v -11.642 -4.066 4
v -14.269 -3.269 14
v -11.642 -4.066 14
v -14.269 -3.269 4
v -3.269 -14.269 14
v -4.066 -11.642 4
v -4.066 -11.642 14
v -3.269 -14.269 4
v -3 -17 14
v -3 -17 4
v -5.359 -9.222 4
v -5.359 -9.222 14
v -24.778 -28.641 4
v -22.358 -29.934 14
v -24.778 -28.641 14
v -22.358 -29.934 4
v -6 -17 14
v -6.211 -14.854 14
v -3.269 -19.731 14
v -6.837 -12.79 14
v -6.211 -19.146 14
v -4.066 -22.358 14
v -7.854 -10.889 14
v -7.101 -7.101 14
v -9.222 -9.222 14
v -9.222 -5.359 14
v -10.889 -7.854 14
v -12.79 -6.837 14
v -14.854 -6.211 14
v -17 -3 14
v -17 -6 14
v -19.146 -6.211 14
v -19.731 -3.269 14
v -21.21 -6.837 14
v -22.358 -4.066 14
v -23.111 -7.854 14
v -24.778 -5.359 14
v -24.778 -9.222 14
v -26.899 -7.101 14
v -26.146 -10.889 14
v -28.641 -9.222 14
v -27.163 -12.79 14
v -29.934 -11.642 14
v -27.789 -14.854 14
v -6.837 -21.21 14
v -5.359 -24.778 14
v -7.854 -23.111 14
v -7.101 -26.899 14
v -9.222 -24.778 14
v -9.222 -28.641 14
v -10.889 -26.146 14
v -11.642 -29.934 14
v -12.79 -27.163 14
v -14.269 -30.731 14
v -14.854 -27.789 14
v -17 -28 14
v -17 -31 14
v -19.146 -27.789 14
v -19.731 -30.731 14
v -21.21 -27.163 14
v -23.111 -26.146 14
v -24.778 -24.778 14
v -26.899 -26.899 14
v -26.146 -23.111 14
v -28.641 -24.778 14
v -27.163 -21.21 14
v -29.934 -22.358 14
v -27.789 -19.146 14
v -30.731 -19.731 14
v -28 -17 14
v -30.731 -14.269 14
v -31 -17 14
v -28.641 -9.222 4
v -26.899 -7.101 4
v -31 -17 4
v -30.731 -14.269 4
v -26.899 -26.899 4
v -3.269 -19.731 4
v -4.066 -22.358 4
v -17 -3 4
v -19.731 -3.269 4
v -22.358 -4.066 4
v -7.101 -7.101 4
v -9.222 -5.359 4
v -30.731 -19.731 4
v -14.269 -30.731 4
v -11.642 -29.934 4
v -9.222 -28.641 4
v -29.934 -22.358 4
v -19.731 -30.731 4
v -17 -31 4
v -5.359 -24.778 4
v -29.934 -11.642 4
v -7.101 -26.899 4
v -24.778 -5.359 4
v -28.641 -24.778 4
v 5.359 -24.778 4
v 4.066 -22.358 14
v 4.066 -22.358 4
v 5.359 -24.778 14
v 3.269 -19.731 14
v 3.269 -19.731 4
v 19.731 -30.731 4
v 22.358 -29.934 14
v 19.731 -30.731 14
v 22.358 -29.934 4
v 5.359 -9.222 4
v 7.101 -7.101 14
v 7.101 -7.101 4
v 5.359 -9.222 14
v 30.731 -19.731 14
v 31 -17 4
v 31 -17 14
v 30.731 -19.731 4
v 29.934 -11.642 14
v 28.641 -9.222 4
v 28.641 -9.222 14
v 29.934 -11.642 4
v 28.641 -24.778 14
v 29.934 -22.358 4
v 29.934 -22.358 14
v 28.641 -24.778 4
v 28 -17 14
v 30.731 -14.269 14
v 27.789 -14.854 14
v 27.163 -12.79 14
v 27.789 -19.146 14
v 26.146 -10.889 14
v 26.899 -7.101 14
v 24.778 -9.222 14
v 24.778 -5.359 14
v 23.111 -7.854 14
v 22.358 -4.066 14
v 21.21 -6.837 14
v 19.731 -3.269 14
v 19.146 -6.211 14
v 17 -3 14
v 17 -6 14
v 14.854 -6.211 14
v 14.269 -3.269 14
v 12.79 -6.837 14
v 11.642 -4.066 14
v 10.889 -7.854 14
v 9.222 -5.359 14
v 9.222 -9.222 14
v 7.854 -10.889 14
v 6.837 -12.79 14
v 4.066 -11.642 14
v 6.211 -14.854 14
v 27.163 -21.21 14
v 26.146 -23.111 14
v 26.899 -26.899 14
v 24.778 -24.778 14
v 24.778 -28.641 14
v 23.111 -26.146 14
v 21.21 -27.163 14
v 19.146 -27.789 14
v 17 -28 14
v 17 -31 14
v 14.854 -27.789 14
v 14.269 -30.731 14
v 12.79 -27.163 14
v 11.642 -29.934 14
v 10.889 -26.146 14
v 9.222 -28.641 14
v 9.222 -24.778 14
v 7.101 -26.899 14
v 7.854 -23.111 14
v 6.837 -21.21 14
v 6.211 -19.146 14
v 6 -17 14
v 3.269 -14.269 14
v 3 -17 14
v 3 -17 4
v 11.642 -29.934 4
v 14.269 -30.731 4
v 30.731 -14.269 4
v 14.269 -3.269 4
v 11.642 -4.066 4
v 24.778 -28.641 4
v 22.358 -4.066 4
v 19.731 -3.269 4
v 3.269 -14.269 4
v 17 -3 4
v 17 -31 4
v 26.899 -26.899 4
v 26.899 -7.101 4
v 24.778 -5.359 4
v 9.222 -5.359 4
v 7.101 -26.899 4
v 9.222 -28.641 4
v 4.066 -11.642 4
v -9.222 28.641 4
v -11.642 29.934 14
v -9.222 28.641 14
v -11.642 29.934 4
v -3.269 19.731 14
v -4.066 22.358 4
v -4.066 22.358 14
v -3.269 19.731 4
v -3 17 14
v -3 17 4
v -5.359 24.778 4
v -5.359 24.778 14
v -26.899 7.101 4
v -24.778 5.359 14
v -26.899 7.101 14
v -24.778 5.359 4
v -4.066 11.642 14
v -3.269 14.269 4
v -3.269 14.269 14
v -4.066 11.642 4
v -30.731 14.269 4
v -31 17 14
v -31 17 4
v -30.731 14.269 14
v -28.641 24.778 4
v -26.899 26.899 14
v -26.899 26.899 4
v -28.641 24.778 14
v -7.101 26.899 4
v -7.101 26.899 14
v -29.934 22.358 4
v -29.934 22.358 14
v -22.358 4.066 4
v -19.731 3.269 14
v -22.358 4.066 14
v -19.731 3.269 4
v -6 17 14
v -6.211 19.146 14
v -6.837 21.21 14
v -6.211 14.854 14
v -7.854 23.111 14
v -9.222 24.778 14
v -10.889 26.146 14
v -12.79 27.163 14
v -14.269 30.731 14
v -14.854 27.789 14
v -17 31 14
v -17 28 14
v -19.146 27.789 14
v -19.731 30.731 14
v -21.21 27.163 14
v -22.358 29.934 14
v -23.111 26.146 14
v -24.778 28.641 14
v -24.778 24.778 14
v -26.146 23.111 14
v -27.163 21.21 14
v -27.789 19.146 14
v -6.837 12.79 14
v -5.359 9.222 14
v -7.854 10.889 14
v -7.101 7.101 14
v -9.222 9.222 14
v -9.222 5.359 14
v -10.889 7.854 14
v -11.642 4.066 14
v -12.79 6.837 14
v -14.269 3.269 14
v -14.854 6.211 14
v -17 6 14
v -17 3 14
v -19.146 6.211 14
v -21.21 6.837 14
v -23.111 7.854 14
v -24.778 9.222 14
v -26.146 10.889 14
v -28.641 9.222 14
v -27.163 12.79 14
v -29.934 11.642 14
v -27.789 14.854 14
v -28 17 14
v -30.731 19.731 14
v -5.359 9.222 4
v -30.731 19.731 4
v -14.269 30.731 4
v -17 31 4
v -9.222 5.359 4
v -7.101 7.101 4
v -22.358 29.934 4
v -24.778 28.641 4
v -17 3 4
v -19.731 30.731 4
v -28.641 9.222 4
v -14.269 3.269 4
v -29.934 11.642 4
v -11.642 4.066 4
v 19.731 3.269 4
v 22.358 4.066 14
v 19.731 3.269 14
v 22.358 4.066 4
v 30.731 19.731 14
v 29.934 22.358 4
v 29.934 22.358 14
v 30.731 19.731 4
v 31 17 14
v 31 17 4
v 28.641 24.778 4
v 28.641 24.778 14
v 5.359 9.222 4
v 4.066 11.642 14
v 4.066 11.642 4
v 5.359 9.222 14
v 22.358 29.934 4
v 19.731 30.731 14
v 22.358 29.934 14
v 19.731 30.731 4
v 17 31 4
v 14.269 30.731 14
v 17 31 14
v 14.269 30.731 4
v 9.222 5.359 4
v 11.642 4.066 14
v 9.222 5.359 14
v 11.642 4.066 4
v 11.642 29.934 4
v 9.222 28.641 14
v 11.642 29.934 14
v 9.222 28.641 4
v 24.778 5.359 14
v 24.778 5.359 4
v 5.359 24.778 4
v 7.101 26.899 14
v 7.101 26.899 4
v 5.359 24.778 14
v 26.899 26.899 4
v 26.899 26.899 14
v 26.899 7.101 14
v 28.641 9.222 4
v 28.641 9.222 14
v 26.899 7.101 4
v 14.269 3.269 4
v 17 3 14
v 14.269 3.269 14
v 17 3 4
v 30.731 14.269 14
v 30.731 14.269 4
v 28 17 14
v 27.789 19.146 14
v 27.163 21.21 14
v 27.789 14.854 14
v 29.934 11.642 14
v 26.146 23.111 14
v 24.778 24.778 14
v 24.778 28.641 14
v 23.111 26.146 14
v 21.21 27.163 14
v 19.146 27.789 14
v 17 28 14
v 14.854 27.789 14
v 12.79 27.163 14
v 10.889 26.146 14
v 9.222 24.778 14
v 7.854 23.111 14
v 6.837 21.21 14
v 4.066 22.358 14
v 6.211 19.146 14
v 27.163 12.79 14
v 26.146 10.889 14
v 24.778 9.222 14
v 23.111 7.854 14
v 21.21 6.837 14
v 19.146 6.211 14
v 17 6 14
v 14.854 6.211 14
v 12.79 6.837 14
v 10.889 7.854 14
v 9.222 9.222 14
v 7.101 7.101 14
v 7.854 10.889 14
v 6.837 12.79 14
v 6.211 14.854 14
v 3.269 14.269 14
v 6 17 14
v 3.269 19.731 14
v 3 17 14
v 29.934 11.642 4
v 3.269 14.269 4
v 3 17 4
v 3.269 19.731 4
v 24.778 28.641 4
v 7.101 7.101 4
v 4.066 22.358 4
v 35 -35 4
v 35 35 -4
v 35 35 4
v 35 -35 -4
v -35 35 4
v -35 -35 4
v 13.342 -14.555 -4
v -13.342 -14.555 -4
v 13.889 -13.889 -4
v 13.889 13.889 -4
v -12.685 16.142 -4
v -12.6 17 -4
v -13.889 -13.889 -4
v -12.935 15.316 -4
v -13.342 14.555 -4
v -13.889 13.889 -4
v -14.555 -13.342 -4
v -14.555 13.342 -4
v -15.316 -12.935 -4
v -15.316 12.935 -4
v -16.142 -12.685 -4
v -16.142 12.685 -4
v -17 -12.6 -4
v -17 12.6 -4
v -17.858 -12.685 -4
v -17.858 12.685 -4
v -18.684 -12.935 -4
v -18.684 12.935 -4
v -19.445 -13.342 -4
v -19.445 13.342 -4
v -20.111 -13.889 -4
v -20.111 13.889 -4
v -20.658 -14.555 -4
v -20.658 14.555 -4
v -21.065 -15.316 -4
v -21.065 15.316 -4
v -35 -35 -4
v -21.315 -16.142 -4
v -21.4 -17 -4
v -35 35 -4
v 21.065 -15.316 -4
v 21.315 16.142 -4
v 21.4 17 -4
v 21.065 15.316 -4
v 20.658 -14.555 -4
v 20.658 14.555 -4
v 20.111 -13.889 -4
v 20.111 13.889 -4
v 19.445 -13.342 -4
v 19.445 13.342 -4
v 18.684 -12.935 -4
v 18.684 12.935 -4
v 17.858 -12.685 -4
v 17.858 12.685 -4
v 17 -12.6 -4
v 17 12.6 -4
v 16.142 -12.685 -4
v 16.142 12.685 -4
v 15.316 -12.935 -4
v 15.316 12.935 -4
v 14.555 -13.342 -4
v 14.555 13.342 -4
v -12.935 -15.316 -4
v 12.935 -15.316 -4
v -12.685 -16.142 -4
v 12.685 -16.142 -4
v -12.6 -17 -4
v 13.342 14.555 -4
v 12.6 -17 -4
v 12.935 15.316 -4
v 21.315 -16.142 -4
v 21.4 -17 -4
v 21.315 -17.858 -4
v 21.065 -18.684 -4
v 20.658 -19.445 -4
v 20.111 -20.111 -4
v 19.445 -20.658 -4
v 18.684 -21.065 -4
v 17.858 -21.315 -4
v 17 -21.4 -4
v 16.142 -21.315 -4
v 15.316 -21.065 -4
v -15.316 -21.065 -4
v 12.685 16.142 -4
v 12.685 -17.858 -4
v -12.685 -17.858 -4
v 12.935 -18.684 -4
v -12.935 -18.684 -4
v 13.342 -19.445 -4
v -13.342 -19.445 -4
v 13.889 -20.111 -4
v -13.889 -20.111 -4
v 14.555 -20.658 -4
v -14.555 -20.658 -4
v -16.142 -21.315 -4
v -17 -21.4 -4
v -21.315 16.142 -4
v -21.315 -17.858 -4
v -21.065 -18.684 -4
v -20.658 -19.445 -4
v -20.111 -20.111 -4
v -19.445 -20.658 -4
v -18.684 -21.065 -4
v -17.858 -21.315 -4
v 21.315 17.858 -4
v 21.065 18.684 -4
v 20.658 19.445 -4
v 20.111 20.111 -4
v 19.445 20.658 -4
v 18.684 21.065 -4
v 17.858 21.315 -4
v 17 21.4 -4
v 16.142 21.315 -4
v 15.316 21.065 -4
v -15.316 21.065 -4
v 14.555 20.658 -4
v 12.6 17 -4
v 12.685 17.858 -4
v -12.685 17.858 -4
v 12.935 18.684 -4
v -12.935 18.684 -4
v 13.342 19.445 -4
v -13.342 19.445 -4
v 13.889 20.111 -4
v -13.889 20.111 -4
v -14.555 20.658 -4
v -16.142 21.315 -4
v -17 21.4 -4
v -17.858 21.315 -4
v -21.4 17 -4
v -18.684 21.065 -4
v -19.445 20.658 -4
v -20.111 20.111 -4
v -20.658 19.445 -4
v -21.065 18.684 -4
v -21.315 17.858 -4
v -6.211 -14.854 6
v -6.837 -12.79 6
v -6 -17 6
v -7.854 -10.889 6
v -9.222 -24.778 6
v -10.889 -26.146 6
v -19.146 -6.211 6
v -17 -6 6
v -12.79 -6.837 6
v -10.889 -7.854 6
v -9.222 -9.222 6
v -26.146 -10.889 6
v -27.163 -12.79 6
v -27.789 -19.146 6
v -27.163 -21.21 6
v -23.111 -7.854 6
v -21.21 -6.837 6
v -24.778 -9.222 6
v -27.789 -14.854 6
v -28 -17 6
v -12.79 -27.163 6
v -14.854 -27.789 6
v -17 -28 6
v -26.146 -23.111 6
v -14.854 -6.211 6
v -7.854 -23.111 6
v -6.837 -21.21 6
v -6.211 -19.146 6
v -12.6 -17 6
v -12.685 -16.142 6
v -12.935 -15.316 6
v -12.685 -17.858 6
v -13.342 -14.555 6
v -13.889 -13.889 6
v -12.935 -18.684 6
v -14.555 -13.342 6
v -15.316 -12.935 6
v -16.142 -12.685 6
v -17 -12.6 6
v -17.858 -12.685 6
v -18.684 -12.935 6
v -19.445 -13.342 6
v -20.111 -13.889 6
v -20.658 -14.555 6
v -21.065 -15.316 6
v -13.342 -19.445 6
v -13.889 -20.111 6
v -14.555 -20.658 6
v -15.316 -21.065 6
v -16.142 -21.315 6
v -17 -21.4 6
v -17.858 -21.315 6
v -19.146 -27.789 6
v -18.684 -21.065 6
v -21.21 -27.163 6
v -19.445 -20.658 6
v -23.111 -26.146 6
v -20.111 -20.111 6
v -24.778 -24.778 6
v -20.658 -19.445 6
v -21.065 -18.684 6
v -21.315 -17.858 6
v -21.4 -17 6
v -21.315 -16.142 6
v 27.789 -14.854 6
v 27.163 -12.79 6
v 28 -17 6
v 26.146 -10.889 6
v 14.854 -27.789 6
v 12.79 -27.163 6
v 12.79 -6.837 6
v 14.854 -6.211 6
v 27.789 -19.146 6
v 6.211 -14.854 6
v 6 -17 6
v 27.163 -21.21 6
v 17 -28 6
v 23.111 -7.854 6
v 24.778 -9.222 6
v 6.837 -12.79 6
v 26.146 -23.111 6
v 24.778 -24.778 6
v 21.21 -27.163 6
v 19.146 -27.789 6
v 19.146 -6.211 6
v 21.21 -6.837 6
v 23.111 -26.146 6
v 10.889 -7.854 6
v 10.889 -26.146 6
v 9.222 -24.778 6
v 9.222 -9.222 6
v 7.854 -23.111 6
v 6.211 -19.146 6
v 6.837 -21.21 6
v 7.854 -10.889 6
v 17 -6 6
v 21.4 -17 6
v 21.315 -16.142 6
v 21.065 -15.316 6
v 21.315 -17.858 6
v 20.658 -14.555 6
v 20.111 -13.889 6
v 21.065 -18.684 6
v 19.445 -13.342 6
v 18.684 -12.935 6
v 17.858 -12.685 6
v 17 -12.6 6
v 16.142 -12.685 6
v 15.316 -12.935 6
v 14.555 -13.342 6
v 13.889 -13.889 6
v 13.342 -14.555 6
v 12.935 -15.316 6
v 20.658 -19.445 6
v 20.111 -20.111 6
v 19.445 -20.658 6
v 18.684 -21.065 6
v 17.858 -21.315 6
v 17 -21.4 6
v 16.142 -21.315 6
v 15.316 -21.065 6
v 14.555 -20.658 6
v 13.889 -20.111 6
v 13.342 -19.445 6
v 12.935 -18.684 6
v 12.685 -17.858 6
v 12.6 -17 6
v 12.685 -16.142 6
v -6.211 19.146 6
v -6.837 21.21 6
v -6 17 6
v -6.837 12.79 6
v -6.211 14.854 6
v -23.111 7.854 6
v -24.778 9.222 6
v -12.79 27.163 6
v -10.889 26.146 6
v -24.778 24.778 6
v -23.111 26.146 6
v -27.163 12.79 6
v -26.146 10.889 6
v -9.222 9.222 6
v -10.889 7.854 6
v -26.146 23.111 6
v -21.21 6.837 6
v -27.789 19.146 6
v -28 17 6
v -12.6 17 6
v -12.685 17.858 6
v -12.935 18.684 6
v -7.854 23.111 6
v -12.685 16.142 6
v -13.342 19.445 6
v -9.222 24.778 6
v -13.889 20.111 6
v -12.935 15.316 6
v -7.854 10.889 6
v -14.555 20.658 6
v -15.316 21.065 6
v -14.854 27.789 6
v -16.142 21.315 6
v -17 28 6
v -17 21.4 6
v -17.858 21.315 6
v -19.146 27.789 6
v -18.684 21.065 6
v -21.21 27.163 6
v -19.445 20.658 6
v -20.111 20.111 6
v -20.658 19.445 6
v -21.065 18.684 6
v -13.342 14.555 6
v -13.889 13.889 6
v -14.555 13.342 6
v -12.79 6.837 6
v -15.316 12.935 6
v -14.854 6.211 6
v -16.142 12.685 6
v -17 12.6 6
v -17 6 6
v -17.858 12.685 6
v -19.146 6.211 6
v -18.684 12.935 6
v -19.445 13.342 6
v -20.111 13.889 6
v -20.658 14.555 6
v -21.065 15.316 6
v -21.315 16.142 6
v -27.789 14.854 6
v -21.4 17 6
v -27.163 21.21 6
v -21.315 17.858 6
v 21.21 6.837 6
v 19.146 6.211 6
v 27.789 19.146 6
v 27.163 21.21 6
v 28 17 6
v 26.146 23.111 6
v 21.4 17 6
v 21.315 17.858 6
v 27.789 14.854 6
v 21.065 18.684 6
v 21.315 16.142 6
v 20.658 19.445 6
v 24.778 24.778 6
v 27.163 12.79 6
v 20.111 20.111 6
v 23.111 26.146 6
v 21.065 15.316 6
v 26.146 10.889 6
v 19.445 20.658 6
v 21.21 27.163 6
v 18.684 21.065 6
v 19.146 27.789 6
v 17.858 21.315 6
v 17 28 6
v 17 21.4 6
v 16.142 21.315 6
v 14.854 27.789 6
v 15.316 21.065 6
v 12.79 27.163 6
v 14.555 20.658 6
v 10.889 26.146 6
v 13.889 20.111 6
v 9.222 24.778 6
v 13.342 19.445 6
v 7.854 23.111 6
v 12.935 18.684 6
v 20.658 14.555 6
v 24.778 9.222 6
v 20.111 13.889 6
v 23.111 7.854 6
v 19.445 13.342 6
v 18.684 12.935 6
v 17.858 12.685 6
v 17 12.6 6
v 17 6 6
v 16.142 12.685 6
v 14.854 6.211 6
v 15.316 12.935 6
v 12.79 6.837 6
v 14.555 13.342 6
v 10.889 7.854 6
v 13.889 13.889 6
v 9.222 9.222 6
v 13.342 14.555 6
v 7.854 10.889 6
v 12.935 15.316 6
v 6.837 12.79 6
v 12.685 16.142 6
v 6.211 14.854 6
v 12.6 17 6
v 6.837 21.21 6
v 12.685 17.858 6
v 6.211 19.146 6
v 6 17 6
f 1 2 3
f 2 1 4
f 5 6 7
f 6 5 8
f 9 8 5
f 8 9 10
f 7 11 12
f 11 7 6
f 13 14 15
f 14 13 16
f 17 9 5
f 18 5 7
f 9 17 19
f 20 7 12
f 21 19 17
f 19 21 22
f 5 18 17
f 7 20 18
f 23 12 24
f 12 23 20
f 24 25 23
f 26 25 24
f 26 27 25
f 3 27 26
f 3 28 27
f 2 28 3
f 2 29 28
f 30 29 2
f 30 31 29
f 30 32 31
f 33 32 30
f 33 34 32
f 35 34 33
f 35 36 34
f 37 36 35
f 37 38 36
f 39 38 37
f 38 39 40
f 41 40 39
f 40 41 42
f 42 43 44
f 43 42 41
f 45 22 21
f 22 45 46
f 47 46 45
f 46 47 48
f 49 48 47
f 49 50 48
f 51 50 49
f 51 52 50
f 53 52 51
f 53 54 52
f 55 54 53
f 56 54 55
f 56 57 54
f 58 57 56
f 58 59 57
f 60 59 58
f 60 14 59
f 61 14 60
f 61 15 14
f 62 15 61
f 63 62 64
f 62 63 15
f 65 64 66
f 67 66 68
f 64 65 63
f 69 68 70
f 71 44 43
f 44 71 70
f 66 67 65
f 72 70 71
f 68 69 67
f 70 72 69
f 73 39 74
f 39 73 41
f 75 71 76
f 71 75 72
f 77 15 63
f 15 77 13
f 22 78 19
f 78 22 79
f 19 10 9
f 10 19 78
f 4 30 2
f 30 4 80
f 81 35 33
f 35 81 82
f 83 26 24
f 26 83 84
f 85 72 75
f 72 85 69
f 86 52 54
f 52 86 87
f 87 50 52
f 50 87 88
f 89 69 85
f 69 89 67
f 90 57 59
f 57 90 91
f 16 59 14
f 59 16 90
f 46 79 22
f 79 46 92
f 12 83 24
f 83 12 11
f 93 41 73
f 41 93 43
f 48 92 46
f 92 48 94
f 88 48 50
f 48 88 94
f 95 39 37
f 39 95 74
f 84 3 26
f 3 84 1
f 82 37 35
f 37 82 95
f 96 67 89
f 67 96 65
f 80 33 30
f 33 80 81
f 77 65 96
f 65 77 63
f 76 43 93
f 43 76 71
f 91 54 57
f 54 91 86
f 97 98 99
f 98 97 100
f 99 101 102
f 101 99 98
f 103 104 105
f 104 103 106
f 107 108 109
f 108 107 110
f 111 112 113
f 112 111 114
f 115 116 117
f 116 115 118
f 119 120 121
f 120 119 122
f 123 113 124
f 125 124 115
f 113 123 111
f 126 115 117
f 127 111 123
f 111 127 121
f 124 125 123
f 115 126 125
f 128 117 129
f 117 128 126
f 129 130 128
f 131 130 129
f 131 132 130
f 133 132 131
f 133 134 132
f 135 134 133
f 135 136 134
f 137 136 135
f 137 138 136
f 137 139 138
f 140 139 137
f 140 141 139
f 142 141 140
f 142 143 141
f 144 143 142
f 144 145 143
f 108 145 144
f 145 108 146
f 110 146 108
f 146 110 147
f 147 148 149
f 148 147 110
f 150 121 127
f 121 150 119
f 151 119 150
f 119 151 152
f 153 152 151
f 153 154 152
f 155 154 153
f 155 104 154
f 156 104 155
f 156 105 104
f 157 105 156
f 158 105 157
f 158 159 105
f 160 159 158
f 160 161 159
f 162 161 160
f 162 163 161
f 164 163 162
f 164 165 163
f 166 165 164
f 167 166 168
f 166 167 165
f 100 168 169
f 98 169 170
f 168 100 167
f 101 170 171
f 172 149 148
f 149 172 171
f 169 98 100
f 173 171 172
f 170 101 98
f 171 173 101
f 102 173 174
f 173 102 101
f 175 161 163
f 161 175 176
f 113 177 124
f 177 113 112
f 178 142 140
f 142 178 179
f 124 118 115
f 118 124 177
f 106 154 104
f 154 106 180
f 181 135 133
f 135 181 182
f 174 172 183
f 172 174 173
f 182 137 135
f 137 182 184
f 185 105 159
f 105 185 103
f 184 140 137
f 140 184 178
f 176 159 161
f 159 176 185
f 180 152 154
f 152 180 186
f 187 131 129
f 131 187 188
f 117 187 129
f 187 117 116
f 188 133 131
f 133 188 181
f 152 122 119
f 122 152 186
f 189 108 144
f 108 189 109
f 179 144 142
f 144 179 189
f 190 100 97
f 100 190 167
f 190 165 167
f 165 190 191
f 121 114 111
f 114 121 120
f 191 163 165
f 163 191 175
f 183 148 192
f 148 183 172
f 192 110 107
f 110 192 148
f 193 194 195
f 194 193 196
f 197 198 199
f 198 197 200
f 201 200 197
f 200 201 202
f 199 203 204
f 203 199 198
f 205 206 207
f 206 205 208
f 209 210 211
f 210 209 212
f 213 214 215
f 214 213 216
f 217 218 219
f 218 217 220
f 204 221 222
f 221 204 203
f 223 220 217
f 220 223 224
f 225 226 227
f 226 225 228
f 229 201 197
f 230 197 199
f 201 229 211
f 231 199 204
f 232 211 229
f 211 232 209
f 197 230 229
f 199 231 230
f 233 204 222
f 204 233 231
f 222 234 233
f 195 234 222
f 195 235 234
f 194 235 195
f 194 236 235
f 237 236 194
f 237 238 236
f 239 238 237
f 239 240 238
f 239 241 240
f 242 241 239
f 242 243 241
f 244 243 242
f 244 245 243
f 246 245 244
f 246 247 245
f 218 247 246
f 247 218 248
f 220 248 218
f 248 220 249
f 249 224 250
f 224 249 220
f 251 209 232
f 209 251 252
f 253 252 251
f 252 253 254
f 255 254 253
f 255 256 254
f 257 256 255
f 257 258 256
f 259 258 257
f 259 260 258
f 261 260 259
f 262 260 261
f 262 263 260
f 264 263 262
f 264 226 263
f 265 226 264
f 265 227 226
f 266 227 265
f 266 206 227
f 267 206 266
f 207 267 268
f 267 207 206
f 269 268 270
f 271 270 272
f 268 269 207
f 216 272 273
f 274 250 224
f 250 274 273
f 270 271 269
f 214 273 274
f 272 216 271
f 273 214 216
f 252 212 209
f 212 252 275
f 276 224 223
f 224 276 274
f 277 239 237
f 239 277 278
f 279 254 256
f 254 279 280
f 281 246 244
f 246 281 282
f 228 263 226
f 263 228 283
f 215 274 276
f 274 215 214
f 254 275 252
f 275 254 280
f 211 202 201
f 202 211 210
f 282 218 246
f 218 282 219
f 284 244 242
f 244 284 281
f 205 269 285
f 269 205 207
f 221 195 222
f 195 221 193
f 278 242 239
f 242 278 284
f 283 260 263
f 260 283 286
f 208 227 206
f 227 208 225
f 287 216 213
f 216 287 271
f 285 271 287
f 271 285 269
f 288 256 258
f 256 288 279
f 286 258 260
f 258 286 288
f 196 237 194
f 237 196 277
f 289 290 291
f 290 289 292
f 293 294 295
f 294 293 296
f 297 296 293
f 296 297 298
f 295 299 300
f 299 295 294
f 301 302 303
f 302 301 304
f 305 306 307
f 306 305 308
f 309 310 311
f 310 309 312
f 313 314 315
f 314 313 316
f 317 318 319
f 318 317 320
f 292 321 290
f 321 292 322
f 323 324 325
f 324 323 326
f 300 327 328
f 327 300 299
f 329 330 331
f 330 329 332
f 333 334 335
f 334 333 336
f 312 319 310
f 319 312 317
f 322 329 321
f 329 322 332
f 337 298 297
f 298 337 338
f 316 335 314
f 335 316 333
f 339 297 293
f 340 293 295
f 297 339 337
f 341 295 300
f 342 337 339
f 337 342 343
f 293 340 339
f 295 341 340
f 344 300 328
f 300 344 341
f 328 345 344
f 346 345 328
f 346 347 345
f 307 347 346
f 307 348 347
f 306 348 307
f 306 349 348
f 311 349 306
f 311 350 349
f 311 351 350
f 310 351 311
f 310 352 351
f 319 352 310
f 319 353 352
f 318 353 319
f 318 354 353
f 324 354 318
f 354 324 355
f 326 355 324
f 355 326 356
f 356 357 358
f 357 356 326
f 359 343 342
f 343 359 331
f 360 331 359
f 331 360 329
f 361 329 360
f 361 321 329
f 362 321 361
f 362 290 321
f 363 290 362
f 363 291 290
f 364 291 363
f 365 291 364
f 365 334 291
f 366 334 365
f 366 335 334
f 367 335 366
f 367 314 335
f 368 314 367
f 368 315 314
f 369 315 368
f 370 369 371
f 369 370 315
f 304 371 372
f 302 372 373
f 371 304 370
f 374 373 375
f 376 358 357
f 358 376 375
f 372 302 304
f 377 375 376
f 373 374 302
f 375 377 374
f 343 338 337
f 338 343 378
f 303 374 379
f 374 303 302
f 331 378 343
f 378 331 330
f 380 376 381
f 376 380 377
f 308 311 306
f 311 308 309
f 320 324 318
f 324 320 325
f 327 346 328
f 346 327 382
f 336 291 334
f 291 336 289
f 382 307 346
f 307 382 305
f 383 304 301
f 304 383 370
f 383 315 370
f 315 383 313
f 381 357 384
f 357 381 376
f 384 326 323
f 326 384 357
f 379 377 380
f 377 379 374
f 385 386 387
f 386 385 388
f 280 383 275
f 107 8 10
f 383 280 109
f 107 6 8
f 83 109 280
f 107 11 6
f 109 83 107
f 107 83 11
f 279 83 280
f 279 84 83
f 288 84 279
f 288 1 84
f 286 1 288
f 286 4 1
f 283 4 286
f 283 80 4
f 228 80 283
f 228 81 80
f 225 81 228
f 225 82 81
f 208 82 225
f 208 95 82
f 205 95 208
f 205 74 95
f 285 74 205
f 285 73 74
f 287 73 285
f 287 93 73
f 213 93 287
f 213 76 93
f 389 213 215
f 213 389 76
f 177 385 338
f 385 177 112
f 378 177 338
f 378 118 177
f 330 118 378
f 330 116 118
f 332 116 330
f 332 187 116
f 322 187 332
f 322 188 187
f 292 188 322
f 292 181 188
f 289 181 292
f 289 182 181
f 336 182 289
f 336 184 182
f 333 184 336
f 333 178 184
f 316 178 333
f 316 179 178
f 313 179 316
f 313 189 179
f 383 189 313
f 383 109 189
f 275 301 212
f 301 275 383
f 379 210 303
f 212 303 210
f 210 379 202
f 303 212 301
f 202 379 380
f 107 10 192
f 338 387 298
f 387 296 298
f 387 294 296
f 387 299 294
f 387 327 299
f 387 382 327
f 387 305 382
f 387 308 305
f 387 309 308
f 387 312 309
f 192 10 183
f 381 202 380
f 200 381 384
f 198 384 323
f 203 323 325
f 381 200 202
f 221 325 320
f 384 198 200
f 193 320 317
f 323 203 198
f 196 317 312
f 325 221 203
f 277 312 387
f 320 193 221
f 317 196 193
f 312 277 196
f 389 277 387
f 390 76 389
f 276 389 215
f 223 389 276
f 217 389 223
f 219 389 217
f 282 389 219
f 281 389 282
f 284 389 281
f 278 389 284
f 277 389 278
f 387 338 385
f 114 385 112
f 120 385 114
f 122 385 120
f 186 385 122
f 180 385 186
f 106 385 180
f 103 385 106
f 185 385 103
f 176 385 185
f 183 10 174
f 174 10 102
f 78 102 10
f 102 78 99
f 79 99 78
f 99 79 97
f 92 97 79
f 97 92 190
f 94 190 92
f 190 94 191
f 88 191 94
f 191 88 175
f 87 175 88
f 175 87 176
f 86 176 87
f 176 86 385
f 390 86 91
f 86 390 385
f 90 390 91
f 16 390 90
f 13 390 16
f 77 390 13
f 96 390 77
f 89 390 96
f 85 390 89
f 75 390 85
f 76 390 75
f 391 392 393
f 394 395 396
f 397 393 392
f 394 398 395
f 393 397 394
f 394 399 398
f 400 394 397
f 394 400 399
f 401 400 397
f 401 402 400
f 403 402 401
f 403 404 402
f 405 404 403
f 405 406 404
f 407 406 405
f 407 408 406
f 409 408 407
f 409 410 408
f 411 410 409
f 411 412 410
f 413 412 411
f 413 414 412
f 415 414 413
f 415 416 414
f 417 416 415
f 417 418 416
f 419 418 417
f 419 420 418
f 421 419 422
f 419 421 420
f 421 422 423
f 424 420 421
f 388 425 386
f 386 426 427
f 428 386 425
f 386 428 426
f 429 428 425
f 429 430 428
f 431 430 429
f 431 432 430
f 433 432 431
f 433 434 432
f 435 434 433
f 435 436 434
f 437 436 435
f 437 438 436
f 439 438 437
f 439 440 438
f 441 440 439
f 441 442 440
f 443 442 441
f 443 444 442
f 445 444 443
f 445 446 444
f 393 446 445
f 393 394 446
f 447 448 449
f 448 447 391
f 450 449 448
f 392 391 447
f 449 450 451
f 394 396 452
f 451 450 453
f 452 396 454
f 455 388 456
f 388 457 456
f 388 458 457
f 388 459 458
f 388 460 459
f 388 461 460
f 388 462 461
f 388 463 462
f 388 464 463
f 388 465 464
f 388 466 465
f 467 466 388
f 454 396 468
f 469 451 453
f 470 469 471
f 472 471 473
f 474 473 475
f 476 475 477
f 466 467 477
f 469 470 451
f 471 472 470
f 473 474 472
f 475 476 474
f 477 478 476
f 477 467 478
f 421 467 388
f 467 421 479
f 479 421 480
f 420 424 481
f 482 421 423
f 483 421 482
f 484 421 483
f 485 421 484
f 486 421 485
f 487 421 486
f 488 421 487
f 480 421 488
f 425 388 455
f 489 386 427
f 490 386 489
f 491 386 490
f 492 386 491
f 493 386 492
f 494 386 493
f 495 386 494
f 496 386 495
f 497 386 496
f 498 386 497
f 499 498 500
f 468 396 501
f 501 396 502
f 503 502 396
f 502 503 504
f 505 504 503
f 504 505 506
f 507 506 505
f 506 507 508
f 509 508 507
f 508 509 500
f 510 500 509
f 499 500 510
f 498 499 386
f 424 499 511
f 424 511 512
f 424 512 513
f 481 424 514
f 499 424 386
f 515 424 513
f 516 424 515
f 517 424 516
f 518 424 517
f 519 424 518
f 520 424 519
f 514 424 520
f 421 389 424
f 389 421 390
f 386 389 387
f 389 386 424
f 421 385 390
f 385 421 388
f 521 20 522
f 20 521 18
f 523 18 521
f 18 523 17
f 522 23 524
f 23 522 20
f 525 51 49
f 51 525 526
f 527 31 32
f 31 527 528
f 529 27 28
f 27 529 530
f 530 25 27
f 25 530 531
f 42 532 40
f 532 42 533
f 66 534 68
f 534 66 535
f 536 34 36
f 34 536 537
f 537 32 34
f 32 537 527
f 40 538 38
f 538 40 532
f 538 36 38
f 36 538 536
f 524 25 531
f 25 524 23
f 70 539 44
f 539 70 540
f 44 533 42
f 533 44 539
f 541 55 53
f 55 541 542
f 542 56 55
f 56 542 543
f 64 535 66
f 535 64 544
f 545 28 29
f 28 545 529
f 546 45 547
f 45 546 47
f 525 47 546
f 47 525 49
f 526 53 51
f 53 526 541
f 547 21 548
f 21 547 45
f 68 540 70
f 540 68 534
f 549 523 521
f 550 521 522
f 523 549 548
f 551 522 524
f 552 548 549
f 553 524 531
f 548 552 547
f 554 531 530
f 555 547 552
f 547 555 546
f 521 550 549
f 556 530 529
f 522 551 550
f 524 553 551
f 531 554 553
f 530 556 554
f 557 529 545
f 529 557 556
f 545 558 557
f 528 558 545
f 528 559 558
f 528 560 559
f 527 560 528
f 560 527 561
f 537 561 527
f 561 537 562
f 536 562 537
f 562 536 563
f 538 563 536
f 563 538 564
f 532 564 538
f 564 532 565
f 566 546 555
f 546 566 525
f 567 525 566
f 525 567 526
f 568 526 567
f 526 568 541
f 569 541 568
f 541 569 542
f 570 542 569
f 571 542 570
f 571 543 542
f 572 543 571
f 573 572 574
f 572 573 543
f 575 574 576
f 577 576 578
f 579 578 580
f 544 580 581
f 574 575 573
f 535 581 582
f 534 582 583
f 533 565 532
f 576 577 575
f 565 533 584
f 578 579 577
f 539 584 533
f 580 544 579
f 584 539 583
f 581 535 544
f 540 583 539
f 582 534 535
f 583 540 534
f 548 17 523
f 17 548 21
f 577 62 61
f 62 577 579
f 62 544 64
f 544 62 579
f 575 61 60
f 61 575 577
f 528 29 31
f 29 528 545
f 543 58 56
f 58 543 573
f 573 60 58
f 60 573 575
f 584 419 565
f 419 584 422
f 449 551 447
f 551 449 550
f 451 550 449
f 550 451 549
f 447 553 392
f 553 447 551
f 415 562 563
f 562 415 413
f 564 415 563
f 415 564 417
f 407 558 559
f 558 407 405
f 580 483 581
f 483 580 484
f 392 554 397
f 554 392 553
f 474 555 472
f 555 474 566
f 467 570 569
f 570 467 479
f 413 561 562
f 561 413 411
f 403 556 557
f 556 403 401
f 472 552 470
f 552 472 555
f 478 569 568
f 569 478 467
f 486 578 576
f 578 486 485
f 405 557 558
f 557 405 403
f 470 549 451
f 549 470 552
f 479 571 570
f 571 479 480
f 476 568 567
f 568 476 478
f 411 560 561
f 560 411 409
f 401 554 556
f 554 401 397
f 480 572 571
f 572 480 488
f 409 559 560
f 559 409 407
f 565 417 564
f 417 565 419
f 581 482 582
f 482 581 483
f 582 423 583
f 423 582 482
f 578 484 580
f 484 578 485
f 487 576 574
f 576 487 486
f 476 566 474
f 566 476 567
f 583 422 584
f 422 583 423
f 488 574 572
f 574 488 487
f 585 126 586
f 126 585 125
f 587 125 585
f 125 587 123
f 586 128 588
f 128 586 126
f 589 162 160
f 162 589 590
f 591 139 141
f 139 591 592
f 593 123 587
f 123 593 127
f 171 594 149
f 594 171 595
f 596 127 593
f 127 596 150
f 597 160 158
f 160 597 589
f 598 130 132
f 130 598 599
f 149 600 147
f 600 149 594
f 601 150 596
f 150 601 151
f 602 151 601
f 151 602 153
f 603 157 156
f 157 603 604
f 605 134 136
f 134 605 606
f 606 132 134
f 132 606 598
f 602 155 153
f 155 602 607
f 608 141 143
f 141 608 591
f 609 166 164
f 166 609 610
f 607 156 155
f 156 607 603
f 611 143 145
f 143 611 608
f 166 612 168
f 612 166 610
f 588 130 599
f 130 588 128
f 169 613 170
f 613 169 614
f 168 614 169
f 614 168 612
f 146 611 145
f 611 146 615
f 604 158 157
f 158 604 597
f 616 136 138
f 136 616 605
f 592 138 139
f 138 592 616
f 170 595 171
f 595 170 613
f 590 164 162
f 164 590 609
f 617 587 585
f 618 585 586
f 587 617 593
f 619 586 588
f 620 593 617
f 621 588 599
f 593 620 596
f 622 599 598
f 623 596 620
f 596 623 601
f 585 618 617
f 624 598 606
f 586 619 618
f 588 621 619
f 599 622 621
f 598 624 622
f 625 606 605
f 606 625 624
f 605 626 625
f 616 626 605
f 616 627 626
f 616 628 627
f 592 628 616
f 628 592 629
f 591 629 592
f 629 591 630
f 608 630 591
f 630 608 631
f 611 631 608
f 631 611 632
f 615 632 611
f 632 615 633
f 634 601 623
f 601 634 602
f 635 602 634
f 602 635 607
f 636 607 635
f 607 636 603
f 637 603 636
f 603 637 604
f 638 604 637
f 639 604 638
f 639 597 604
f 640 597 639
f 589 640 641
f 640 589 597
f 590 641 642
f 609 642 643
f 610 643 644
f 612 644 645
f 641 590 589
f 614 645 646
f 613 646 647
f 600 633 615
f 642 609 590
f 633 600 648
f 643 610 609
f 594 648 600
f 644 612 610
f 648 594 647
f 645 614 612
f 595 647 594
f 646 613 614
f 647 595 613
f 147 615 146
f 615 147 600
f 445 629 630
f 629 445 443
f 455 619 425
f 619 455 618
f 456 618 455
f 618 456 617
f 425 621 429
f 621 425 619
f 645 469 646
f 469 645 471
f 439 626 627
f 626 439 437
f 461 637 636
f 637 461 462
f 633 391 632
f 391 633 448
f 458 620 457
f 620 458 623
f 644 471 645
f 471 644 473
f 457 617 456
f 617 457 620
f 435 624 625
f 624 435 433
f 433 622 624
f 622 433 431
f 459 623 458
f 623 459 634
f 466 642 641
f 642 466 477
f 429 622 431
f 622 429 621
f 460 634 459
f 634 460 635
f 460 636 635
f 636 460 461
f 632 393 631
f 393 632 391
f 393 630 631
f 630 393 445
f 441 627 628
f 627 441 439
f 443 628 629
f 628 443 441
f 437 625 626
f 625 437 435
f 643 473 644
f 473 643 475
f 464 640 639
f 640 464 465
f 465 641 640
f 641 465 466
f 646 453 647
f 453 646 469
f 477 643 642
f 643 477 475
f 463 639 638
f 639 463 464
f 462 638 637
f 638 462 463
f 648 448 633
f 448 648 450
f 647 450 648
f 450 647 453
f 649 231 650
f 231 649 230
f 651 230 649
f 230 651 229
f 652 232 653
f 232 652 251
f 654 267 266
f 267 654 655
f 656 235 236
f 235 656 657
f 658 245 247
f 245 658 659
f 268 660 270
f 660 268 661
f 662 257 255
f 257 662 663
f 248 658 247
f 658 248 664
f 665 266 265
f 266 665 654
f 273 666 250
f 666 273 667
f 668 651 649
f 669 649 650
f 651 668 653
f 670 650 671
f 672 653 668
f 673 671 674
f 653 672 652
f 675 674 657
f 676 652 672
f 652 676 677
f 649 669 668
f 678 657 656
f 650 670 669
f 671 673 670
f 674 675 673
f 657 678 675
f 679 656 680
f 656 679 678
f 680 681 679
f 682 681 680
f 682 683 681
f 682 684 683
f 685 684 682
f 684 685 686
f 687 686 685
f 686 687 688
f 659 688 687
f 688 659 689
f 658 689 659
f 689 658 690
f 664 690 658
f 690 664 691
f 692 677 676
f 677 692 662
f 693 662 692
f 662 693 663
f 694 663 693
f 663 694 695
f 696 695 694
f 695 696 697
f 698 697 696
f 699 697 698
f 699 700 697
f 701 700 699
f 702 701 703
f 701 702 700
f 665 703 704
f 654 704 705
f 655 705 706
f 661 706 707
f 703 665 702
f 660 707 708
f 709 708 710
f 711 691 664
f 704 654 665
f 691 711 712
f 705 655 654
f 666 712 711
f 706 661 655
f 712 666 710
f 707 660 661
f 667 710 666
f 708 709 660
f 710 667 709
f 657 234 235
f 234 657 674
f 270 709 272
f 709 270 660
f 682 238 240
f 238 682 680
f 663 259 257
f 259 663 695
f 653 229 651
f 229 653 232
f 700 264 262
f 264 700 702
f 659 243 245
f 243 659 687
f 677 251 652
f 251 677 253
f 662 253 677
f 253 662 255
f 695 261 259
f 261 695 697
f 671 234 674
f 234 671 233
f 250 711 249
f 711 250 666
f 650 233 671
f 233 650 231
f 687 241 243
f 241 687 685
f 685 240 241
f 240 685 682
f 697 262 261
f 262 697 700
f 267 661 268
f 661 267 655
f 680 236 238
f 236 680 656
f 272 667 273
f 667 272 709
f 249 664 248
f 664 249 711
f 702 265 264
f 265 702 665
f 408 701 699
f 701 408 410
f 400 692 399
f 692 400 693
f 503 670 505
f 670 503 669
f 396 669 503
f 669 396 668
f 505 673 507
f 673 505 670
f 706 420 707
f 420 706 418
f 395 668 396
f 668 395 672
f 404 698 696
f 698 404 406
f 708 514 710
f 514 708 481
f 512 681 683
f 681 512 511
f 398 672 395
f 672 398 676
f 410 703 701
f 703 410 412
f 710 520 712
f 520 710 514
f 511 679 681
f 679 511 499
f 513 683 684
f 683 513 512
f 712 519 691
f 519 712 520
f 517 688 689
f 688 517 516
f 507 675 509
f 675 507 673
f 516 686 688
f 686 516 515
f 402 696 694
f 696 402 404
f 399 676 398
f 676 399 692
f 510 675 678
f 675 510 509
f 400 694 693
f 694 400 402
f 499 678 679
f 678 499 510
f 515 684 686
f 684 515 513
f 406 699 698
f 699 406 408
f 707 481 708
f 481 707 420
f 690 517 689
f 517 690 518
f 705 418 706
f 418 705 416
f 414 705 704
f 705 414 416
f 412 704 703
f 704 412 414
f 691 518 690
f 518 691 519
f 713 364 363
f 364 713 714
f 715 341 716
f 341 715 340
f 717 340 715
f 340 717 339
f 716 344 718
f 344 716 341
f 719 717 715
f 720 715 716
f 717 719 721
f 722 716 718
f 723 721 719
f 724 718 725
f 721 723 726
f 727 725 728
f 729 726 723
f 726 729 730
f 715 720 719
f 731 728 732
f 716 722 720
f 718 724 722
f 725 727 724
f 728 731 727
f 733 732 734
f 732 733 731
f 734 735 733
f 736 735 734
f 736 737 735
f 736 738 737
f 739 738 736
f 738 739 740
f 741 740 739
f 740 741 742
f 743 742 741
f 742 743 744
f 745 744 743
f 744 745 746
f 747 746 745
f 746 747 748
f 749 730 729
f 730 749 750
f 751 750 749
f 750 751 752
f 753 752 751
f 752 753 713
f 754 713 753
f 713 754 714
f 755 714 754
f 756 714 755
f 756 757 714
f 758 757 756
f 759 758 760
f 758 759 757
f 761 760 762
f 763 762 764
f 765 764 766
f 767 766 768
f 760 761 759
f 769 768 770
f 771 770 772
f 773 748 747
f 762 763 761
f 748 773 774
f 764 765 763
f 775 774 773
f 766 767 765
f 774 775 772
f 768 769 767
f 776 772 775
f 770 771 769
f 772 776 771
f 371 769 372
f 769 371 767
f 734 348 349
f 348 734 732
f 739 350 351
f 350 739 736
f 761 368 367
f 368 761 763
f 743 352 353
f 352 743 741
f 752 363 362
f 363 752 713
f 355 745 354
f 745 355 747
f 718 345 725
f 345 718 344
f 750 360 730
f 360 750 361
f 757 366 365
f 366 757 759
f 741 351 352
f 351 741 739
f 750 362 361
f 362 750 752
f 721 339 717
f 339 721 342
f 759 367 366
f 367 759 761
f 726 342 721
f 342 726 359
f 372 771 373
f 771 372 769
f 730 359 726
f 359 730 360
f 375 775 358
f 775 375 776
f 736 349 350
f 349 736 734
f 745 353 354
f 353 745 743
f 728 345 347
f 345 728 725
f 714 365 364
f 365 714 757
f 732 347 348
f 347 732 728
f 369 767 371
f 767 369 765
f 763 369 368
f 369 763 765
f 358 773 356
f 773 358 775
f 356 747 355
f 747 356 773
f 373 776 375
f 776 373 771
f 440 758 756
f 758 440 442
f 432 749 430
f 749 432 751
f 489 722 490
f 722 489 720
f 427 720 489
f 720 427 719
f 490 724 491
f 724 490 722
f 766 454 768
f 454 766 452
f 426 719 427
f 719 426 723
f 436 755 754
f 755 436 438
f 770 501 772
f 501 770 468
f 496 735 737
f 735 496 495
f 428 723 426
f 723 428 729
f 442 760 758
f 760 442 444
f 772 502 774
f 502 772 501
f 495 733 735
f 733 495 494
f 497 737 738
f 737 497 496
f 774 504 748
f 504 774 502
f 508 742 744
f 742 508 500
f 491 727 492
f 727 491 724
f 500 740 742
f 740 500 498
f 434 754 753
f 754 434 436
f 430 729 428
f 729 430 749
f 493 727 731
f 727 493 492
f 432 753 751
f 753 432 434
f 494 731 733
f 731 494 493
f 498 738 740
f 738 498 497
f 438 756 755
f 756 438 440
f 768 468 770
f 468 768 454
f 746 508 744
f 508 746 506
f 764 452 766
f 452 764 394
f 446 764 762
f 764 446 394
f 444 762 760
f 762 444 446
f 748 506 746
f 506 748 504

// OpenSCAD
$fn = 32;

// ----------------------------------------------------------------------
// Socket pad plate
// bosses with counterbored sockets for the screws
// ----------------------------------------------------------------------

// --- parameters (mm) ---
base_t = 8;        // base plate thickness
boss_h = 10;       // boss height above the base plate
boss_d = 28;       // boss diameter
socket_d = 22;     // socket diameter
socket_depth = 8;  // socket depth from the boss face
bolt_d = 8.8;      // screw clearance hole through the socket floor
rows = 2;          // boss rows
cols = 2;          // bosses per row
pitch = 34;        // boss pitch

// --- derived feature positions (mm) ---
height = base_t + boss_h;           // = 18   overall height of the part
plate = [pitch * (cols - 1) + boss_d + 8, pitch * (rows - 1) + boss_d + 8, base_t];  // = [70, 70, 8]   overall size (x, y, z)
span_x = pitch * (cols - 1);        // = 34   distance between outer bosses
span_y = pitch * (rows - 1);        // = 34   distance between boss rows
origin_x = -span_x / 2;             // = -17   X of the first boss
origin_y = -span_y / 2;             // = -17   Y of the first boss
feature_centers = [
  [origin_x + 0 * pitch, origin_y + 0 * pitch],
  [origin_x + 1 * pitch, origin_y + 0 * pitch],
  [origin_x + 0 * pitch, origin_y + 1 * pitch],
  [origin_x + 1 * pitch, origin_y + 1 * pitch]
];   // boss centres: sockets, holes and the pads themselves are placed from here

// base plate, bosses on feature_centers, socket + through hole in each
difference() {
  union() {
    cube(plate, center = true);
    for (centre = feature_centers)
      translate([centre[0], centre[1], plate[2] / 2 - 1])
        cylinder(d = boss_d, h = boss_h + 1);
  }
  for (centre = feature_centers) {
    translate([centre[0], centre[1], plate[2] / 2 + boss_h - socket_depth])
      cylinder(d = socket_d, h = socket_depth + 1);
    translate([centre[0], centre[1], -height])
      cylinder(d = bolt_d, h = 2 * height + 2);  // through the socket floor
  }
}
